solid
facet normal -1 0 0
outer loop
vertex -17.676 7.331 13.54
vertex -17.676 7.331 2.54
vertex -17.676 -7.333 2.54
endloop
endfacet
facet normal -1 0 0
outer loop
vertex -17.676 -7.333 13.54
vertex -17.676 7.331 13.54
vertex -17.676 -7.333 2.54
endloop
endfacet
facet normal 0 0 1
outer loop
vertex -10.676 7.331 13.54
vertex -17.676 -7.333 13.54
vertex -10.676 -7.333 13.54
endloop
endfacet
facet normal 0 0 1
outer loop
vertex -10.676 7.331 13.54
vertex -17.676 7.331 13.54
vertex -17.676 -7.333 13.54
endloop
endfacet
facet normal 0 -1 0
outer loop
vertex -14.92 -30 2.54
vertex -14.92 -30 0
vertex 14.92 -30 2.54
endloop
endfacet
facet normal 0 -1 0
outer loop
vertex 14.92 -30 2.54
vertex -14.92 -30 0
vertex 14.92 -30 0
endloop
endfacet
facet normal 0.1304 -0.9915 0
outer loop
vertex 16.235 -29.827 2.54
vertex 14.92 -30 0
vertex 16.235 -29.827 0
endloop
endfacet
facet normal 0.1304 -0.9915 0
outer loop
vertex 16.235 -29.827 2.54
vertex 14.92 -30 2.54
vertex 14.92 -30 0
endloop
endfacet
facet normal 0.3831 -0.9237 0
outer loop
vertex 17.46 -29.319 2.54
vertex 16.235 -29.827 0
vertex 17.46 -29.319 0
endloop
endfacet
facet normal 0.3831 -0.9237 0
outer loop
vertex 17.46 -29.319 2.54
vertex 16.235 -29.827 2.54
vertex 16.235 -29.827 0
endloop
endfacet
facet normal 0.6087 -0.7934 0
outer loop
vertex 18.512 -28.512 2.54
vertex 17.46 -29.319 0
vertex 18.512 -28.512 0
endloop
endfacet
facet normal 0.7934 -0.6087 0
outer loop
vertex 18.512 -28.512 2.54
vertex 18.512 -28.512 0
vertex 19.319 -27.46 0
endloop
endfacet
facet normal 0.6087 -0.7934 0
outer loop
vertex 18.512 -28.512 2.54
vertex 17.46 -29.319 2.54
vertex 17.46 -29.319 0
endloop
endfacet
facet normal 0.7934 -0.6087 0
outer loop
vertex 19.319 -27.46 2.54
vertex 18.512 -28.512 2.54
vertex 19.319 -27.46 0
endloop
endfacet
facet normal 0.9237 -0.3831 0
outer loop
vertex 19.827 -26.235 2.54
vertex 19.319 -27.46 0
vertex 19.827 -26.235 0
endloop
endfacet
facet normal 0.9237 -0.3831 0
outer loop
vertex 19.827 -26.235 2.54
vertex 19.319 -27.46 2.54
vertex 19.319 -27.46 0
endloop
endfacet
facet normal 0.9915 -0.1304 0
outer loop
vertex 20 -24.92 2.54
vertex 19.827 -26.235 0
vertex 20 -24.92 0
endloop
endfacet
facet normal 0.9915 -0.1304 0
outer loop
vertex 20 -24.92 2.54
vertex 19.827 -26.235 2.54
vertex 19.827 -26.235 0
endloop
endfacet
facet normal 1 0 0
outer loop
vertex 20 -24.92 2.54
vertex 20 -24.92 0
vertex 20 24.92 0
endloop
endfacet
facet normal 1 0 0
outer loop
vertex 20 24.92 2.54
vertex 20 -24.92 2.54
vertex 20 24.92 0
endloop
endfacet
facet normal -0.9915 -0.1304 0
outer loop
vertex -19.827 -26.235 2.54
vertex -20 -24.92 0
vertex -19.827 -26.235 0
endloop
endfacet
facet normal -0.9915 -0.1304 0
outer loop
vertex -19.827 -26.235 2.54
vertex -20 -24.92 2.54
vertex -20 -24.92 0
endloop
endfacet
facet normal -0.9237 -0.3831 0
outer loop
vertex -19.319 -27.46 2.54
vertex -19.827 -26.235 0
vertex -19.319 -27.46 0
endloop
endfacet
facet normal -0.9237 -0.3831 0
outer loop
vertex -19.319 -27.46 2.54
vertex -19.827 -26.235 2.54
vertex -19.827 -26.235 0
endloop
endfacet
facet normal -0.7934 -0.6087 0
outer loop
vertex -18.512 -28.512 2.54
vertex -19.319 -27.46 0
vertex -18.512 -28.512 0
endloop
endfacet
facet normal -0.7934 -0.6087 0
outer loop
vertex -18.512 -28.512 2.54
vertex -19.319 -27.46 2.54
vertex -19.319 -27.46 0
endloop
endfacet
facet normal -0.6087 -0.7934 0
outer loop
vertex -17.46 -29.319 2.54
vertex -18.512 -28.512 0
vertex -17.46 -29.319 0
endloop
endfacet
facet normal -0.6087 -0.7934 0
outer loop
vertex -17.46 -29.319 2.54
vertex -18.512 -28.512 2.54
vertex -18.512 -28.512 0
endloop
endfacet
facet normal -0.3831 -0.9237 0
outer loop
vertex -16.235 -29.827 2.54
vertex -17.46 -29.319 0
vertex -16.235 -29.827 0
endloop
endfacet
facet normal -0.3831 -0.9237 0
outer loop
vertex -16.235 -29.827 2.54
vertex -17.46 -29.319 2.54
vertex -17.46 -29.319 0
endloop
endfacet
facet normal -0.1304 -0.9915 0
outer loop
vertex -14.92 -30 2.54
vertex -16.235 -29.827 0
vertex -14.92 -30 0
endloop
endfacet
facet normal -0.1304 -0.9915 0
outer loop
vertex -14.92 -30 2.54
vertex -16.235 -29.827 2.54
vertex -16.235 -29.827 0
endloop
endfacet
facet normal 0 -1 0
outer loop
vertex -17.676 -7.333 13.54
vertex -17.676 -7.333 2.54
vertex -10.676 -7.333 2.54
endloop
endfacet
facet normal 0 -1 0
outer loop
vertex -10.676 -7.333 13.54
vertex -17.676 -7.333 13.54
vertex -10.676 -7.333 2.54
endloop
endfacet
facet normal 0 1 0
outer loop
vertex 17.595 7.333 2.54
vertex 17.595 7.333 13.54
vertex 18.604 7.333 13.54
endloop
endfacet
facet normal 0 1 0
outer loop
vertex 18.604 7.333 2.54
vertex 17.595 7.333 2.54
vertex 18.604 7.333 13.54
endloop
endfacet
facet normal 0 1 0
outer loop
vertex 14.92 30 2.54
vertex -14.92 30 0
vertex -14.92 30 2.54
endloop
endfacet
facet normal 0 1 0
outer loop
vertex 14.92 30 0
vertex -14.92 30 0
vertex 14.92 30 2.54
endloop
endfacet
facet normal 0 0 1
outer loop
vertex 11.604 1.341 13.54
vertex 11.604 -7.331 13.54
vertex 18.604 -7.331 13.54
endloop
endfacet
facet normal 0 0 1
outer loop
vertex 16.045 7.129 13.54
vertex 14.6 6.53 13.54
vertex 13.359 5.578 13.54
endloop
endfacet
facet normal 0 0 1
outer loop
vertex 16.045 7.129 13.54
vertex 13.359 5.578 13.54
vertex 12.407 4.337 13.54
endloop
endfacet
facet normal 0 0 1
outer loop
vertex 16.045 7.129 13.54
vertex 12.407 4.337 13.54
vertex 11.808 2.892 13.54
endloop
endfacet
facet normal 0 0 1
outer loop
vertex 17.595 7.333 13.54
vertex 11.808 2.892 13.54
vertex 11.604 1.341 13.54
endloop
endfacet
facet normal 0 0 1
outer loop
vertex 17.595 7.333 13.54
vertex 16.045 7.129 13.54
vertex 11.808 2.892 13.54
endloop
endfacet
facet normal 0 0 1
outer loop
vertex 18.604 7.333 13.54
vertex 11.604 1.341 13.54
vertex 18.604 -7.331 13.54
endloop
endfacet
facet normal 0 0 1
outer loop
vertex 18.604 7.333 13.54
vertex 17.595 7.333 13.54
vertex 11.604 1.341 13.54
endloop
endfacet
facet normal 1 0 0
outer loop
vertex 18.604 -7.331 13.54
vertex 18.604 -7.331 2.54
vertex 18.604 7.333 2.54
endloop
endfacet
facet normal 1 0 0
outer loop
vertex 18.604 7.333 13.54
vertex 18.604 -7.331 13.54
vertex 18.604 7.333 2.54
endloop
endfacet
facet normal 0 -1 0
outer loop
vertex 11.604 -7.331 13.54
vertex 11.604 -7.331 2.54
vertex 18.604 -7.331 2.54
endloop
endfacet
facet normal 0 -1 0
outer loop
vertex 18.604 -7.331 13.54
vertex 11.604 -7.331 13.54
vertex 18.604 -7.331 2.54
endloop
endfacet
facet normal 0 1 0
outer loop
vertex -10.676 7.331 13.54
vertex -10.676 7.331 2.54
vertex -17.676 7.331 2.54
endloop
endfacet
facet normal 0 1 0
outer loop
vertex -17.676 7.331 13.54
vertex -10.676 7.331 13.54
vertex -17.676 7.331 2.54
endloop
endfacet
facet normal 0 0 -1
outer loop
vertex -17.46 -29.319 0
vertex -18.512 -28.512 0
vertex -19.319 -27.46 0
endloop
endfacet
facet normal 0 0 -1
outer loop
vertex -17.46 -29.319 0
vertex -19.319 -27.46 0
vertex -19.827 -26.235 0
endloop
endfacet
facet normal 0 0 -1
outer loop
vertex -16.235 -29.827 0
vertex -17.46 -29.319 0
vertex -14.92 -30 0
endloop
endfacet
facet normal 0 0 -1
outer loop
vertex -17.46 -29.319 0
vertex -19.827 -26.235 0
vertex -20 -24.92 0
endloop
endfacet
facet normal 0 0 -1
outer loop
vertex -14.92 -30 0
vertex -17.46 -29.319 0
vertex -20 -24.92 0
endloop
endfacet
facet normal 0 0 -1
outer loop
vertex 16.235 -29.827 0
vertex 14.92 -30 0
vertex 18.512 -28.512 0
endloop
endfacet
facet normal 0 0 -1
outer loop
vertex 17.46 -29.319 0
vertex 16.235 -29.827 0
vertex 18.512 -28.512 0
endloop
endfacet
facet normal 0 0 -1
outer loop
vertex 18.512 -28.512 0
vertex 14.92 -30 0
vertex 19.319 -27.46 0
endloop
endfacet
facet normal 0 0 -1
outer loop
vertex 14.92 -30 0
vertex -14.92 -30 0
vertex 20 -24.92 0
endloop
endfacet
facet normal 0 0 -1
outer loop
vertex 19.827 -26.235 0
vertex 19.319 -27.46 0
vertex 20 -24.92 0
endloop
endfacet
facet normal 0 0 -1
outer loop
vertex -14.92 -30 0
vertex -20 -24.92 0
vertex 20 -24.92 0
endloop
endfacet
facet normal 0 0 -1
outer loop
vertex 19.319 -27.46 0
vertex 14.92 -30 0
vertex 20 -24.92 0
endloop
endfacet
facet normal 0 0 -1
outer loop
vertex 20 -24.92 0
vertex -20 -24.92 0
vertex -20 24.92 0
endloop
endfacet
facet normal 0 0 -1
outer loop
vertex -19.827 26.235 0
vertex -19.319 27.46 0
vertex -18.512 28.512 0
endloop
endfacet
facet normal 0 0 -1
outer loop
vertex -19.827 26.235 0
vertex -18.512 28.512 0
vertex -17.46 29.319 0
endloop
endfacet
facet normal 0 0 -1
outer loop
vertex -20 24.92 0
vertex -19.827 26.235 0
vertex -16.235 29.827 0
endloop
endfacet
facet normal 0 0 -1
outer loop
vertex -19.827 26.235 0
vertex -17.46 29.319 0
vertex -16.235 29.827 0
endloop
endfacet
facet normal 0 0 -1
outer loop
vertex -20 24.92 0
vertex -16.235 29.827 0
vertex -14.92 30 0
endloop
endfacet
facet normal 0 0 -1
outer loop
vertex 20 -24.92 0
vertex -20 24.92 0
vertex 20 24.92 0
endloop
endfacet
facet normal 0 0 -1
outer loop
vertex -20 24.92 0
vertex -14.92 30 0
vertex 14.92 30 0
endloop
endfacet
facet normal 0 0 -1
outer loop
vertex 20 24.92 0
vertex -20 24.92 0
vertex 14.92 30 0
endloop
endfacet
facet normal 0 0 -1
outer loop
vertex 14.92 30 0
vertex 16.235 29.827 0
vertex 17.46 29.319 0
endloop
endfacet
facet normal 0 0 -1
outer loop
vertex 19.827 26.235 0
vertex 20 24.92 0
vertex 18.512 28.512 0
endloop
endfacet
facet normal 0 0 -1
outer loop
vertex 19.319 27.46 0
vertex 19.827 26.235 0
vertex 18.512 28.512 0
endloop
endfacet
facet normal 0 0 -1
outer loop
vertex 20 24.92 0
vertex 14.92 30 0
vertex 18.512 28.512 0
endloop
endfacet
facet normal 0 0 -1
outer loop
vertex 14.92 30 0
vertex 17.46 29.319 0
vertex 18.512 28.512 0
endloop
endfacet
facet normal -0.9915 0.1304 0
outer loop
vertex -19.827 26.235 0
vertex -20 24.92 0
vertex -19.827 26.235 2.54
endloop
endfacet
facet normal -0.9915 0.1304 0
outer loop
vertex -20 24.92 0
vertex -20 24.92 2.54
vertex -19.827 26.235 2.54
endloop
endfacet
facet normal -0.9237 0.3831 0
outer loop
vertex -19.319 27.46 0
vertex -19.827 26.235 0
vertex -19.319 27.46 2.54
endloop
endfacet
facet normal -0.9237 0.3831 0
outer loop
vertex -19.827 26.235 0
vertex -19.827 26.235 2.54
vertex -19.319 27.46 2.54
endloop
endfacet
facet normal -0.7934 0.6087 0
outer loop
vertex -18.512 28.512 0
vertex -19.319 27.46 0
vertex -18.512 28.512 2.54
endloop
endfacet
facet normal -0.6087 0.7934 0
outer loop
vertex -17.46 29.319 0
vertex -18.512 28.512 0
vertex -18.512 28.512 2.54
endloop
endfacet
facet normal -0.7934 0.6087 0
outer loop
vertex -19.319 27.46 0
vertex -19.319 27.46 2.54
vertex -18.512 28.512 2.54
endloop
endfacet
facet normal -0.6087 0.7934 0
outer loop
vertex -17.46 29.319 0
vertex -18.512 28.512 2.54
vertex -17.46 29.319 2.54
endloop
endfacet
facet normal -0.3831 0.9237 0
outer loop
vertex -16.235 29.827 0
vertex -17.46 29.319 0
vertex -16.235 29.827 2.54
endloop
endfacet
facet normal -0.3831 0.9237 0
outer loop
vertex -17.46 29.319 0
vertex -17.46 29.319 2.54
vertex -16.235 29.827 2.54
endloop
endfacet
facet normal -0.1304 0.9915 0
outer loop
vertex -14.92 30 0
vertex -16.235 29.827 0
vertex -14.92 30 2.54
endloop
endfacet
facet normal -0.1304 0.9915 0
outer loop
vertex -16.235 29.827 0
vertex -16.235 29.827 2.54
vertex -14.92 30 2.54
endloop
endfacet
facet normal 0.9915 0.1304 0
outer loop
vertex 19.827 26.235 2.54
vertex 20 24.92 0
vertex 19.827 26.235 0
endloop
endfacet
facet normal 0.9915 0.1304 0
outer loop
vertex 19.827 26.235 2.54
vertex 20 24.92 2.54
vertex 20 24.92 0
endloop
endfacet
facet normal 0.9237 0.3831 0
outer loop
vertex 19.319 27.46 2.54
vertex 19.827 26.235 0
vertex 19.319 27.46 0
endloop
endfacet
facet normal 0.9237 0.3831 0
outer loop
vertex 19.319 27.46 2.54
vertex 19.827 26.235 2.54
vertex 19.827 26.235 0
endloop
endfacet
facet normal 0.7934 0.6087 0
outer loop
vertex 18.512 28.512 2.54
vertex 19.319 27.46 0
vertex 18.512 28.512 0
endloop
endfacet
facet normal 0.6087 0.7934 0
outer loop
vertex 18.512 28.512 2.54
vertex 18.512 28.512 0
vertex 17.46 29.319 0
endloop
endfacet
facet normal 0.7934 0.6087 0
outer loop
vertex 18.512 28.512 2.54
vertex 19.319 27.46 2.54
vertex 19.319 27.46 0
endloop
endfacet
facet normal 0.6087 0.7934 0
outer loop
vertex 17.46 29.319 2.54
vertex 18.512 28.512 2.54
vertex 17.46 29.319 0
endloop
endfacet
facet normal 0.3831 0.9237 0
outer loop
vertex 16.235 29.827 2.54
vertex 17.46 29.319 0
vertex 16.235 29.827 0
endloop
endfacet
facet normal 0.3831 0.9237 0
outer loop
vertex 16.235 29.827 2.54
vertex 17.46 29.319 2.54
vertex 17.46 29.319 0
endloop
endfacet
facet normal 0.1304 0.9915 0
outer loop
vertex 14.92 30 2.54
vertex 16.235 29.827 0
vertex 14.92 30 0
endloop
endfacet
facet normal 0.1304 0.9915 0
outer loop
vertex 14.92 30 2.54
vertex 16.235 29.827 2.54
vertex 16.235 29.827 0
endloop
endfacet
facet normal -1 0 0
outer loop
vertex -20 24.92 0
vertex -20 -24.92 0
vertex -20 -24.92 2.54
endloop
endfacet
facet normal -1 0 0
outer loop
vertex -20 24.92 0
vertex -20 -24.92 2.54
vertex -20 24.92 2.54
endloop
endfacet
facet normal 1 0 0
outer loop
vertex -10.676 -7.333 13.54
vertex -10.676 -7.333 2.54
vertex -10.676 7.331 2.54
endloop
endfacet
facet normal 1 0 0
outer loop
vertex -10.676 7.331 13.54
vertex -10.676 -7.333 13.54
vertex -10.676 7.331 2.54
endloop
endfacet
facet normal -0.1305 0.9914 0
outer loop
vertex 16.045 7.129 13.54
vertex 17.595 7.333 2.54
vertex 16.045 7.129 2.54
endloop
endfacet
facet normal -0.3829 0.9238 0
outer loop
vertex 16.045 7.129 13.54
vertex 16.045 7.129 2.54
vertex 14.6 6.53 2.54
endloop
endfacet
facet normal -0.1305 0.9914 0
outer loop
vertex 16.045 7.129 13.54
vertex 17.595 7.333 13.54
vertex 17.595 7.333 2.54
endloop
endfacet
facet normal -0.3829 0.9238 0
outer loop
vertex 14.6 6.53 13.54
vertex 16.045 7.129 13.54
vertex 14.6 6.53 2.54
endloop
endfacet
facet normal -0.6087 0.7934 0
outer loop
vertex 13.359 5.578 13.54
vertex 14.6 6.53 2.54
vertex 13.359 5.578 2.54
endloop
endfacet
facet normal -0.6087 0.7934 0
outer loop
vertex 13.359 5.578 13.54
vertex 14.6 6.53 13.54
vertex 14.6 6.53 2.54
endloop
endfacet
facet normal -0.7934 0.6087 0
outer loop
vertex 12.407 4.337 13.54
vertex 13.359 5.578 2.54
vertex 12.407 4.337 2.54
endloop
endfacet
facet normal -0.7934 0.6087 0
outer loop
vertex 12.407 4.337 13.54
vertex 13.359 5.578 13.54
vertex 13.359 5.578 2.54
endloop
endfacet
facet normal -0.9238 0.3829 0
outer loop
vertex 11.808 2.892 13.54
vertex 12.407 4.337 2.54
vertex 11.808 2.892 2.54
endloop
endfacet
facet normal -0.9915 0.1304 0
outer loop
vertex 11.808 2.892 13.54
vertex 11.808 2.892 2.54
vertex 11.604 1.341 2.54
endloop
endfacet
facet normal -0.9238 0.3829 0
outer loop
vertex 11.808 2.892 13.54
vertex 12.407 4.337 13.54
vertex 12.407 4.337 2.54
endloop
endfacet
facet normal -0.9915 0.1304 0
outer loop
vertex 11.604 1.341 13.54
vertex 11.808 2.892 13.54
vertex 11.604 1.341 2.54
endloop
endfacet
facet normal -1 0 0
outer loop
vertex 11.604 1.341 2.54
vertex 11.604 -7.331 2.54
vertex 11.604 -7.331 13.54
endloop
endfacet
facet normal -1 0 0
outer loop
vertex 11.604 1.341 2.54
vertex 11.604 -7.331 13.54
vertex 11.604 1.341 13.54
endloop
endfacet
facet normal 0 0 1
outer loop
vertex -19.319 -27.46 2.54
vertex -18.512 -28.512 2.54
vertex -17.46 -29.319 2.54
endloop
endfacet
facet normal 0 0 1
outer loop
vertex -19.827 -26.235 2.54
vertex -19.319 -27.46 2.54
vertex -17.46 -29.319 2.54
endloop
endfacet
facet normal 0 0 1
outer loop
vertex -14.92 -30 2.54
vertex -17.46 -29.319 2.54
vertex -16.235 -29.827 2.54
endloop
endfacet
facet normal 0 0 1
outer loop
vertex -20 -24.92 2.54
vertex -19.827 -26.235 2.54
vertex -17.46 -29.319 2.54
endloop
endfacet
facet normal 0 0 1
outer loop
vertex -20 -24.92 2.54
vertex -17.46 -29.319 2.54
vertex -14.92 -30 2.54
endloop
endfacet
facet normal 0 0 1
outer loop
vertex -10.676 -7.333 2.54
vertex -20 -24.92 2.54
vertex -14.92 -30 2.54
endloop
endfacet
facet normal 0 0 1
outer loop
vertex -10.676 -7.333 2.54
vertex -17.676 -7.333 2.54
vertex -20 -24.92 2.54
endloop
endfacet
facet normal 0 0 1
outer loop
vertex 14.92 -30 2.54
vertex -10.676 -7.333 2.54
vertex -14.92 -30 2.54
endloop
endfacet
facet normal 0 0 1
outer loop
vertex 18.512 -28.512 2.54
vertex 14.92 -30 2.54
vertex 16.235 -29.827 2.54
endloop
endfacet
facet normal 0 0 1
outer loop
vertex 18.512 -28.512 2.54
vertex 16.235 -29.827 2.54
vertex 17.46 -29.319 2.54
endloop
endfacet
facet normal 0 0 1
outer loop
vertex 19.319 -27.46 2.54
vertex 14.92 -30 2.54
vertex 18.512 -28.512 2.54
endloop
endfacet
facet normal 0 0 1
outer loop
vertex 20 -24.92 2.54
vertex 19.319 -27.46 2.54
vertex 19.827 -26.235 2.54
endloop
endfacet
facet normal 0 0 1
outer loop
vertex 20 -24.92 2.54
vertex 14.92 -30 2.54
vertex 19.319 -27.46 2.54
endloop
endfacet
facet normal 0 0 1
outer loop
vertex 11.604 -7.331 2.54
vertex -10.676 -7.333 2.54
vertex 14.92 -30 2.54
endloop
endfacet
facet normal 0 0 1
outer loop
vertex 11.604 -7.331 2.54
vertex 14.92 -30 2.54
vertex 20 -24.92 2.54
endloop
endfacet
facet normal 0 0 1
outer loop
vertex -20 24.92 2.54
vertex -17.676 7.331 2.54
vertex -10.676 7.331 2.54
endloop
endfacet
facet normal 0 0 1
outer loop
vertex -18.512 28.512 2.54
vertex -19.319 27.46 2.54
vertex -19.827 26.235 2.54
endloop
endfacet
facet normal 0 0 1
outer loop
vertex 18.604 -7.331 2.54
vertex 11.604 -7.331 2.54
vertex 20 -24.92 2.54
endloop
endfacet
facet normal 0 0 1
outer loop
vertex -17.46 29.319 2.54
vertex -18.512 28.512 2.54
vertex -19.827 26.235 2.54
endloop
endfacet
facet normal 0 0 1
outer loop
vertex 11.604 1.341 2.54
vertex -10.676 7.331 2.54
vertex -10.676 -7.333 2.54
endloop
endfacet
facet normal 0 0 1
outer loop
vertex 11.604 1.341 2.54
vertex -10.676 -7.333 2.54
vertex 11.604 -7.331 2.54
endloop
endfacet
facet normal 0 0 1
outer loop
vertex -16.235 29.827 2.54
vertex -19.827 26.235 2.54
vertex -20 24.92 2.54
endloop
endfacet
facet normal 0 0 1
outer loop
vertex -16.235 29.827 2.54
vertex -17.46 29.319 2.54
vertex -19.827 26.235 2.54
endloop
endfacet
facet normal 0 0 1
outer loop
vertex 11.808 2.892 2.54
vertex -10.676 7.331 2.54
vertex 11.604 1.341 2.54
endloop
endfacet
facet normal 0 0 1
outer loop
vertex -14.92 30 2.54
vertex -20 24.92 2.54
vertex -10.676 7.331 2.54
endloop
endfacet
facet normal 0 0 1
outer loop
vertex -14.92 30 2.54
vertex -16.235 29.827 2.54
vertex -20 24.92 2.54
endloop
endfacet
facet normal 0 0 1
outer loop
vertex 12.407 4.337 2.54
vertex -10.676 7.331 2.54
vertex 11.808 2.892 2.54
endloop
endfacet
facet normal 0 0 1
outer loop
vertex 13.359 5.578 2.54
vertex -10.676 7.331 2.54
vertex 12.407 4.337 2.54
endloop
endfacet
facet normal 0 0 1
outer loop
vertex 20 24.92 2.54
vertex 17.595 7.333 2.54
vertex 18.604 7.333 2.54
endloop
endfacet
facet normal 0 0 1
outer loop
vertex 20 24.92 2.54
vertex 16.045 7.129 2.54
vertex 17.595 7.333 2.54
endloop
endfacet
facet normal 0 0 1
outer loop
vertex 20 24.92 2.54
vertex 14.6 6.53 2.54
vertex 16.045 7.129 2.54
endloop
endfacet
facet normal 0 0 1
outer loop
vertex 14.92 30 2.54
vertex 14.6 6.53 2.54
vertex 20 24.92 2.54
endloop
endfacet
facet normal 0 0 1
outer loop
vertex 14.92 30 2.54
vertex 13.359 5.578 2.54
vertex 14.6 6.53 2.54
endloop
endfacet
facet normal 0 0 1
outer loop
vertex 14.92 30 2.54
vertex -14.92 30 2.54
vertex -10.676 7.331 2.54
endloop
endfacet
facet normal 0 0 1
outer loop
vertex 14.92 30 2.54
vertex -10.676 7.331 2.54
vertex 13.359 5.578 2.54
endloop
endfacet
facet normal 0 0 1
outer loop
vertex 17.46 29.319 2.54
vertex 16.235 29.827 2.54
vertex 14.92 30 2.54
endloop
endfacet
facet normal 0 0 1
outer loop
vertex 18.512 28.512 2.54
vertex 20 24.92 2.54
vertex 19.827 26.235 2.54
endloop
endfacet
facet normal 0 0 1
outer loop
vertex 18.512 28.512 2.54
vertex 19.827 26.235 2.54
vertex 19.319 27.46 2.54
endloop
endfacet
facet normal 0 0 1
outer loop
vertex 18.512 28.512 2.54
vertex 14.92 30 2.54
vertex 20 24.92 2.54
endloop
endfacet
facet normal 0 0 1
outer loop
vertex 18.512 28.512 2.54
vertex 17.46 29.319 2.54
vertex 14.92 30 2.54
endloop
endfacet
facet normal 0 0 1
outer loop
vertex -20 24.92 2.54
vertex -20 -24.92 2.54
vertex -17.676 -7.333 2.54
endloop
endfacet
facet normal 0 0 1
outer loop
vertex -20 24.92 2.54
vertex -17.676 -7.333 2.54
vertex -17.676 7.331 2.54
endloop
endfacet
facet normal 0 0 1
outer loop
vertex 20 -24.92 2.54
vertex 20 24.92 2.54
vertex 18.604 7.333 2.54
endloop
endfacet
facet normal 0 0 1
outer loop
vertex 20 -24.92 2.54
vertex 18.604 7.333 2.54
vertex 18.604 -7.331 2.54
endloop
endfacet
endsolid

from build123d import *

# Parameters (mm, degrees)
F0_W     = 40
F0_H     = 60
F1_DEPTH = 2.54
F2_R     = 5.08
F3_W     = 7
F3_H     = 14.663703
F4_DEPTH = 11
F5_R     = 5.991668


with BuildPart() as f1:
    # F0 (on Top) → F1 (new body)
    with BuildSketch(Plane.XY):
        Rectangle(F0_W, F0_H)
    extrude(amount=F1_DEPTH)

    # F2
    f2_edges = [f1.edges().sort_by_distance(p)[0] for p in [
        (-20, -30, 1.27),
        (20, -30, 1.27),
        (-20, 30, 1.27),
        (20, 30, 1.27),
    ]]
    fillet(f2_edges, radius=F2_R)

    # F3 (on face) → F4 (join)
    with BuildSketch(Plane.XY.offset(2.54)):
        Polygon((-17.676001, -7.332922), (-10.676001, -7.332922), (-10.676001, 7.330781), (-11.603794, 7.330781), (-17.676001, 7.330781), align=None)
        with Locations((15.103794, 0.00107)):
            Rectangle(F3_W, F3_H)
    extrude(amount=F4_DEPTH)

    # F5
    f5_edges = [f1.edges().sort_by_distance(p)[0] for p in [
        (11.603794, 7.332922, 8.04),
    ]]
    fillet(f5_edges, radius=F5_R)


solid = f1.part
